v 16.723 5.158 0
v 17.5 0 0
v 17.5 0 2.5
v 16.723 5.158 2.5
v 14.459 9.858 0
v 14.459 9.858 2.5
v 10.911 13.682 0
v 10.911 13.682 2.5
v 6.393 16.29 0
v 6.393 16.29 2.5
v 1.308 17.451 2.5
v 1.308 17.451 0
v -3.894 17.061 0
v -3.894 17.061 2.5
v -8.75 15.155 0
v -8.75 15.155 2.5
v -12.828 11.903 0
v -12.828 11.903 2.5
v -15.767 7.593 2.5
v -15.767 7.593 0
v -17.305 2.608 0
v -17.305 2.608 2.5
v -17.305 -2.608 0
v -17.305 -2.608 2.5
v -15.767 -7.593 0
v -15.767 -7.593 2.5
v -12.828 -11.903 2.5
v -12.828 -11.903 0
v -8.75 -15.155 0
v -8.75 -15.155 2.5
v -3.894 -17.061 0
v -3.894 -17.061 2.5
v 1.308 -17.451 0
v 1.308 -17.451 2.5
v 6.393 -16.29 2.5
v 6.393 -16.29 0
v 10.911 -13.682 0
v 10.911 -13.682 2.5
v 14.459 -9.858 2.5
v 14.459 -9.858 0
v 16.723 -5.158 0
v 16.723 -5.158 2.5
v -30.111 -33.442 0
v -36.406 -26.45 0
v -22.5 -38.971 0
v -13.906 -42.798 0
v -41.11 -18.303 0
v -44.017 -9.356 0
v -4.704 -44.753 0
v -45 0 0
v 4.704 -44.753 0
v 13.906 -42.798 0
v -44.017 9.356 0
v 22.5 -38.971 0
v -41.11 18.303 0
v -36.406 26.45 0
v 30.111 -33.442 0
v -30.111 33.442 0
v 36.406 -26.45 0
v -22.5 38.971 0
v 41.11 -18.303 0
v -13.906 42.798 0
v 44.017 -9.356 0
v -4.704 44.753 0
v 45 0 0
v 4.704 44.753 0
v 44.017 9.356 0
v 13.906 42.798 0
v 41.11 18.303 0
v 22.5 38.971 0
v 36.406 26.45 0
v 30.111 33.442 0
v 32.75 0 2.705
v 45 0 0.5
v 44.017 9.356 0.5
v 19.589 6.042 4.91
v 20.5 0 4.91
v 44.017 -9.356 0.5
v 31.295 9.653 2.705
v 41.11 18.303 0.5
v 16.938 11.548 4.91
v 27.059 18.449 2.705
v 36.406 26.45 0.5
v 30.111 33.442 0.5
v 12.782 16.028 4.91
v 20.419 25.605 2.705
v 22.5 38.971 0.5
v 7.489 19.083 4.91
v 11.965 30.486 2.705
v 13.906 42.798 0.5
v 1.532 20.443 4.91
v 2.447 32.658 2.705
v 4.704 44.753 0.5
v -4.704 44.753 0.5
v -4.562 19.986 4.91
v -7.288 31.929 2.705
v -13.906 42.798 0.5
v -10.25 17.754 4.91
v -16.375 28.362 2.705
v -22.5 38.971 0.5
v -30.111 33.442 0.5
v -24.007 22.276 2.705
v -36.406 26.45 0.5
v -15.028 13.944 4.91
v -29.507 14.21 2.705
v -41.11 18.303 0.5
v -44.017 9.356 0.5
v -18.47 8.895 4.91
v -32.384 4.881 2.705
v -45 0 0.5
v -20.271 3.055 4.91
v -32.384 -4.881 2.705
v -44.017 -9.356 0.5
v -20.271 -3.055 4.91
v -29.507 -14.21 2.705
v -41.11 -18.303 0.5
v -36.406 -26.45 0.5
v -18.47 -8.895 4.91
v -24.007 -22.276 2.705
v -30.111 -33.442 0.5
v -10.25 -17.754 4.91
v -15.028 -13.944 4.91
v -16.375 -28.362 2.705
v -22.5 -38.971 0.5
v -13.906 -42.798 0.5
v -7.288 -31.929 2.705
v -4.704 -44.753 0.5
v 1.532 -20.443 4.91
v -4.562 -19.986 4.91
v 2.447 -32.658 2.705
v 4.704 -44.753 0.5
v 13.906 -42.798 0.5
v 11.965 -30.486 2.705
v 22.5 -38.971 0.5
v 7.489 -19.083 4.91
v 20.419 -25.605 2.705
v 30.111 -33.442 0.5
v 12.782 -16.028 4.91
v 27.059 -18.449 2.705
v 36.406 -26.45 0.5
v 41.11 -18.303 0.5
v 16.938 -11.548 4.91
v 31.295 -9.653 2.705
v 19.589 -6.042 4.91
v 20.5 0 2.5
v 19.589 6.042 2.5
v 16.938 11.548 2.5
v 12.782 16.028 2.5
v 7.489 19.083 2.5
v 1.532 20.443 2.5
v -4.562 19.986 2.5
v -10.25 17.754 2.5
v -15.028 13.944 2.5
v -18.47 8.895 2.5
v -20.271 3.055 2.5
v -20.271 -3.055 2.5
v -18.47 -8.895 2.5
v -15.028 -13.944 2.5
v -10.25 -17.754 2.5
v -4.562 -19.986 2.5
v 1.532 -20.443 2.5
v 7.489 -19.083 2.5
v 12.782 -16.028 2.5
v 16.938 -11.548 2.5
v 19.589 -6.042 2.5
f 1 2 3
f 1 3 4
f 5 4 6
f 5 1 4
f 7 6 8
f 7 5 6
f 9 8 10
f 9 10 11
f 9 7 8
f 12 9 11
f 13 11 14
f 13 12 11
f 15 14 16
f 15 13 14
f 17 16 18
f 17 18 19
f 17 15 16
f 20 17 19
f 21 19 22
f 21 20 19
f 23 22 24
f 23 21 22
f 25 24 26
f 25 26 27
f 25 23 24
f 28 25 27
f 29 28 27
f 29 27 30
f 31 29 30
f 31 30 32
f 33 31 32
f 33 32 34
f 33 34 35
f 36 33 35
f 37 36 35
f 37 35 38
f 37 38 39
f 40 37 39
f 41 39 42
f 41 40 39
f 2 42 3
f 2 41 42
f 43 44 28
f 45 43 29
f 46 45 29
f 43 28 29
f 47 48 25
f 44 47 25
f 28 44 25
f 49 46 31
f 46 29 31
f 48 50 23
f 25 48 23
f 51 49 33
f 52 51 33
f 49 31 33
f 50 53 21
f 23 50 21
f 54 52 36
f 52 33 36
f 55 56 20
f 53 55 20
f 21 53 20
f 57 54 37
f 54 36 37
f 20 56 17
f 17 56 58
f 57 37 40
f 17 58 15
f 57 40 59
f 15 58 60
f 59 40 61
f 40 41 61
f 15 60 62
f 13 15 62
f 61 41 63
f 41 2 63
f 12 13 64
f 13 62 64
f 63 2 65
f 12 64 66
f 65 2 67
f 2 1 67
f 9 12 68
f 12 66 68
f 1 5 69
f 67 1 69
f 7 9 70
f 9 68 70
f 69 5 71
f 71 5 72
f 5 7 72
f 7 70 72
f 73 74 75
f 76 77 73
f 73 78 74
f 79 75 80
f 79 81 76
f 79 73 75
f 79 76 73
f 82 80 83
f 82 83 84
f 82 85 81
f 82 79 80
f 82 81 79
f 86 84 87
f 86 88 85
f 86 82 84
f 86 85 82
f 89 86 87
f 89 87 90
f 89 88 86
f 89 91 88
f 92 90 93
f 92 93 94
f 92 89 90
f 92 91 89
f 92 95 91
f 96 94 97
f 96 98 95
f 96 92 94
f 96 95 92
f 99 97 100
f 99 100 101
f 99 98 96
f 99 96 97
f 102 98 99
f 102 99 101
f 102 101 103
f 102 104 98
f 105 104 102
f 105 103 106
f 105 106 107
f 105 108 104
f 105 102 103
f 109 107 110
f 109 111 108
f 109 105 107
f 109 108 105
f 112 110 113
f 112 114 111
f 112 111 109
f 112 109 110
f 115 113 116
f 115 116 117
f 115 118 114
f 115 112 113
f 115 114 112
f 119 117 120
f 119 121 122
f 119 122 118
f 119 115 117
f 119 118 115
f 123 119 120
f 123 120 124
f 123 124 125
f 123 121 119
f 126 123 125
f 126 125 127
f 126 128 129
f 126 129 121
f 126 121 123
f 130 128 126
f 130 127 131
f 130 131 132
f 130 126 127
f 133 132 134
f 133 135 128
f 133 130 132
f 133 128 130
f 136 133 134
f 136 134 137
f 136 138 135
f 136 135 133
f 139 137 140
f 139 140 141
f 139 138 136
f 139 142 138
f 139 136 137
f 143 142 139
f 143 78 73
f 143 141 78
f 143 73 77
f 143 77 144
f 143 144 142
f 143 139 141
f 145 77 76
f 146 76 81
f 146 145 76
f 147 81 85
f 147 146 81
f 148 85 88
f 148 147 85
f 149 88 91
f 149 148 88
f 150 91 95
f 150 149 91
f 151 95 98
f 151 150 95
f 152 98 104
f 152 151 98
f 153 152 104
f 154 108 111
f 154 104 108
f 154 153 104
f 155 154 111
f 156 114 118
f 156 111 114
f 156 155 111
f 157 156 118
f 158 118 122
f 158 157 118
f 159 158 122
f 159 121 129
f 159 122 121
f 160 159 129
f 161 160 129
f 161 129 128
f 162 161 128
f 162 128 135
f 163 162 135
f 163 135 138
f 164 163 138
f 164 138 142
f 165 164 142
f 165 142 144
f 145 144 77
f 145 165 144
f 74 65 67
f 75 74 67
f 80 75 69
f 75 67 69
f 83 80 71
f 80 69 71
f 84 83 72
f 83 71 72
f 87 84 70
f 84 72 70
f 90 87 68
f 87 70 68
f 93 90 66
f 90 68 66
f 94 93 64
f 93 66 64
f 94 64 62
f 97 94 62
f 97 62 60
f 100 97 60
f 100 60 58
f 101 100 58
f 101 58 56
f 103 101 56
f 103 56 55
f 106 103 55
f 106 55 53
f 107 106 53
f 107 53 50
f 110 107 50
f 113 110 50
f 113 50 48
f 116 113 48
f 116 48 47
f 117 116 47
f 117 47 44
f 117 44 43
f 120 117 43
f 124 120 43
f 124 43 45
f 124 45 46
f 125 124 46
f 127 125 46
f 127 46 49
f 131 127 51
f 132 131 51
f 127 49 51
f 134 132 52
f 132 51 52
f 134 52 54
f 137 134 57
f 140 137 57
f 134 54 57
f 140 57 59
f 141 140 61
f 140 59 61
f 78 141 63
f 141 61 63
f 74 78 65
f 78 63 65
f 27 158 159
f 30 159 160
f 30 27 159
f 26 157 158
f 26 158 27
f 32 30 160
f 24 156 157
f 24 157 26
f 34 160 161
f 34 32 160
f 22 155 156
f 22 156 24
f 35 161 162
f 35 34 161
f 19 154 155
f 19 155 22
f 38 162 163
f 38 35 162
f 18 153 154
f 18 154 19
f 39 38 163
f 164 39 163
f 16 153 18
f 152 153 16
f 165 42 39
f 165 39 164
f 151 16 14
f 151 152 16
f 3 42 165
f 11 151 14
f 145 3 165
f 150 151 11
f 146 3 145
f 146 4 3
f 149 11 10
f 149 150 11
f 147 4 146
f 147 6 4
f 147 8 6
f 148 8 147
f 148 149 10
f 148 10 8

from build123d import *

# Parameters (mm, degrees)
F0_R     = 45
F0_R_2   = 20.5
F1_DEPTH = 5
F0_R_3   = 17.5
F2_DEPTH = 2.5


# Not quite as in the source:
# - a fillet or chamfer that OpenCascade refuses, or shapes differently, is made with other operations: its cross-section is extruded or revolved along the edge and cut away or added


with BuildPart() as f1:
    # F0 (on Top) → F1 (new body)
    with BuildSketch(Plane.XY):
        Circle(F0_R)
        Circle(F0_R_2, mode=Mode.SUBTRACT)
    extrude(amount=F1_DEPTH)

    # F0 (on Top) → F2 (join)
    with BuildSketch(Plane.XY):
        Circle(F0_R_2)
        Circle(F0_R_3, mode=Mode.SUBTRACT)
    extrude(amount=F2_DEPTH)

    # F3: chamfer of 25 x 4.5 on 1 edges, made by hand

    # F3_s1 → F3_t2 (revolve, cut)
    with BuildSketch(Plane.XZ):
        Polygon((45, 0.5), (20, 5), (45, 5), align=None)
    revolve(axis=Axis((0, 0, 5), (0, 0, 1)), mode=Mode.SUBTRACT)


solid = f1.part
